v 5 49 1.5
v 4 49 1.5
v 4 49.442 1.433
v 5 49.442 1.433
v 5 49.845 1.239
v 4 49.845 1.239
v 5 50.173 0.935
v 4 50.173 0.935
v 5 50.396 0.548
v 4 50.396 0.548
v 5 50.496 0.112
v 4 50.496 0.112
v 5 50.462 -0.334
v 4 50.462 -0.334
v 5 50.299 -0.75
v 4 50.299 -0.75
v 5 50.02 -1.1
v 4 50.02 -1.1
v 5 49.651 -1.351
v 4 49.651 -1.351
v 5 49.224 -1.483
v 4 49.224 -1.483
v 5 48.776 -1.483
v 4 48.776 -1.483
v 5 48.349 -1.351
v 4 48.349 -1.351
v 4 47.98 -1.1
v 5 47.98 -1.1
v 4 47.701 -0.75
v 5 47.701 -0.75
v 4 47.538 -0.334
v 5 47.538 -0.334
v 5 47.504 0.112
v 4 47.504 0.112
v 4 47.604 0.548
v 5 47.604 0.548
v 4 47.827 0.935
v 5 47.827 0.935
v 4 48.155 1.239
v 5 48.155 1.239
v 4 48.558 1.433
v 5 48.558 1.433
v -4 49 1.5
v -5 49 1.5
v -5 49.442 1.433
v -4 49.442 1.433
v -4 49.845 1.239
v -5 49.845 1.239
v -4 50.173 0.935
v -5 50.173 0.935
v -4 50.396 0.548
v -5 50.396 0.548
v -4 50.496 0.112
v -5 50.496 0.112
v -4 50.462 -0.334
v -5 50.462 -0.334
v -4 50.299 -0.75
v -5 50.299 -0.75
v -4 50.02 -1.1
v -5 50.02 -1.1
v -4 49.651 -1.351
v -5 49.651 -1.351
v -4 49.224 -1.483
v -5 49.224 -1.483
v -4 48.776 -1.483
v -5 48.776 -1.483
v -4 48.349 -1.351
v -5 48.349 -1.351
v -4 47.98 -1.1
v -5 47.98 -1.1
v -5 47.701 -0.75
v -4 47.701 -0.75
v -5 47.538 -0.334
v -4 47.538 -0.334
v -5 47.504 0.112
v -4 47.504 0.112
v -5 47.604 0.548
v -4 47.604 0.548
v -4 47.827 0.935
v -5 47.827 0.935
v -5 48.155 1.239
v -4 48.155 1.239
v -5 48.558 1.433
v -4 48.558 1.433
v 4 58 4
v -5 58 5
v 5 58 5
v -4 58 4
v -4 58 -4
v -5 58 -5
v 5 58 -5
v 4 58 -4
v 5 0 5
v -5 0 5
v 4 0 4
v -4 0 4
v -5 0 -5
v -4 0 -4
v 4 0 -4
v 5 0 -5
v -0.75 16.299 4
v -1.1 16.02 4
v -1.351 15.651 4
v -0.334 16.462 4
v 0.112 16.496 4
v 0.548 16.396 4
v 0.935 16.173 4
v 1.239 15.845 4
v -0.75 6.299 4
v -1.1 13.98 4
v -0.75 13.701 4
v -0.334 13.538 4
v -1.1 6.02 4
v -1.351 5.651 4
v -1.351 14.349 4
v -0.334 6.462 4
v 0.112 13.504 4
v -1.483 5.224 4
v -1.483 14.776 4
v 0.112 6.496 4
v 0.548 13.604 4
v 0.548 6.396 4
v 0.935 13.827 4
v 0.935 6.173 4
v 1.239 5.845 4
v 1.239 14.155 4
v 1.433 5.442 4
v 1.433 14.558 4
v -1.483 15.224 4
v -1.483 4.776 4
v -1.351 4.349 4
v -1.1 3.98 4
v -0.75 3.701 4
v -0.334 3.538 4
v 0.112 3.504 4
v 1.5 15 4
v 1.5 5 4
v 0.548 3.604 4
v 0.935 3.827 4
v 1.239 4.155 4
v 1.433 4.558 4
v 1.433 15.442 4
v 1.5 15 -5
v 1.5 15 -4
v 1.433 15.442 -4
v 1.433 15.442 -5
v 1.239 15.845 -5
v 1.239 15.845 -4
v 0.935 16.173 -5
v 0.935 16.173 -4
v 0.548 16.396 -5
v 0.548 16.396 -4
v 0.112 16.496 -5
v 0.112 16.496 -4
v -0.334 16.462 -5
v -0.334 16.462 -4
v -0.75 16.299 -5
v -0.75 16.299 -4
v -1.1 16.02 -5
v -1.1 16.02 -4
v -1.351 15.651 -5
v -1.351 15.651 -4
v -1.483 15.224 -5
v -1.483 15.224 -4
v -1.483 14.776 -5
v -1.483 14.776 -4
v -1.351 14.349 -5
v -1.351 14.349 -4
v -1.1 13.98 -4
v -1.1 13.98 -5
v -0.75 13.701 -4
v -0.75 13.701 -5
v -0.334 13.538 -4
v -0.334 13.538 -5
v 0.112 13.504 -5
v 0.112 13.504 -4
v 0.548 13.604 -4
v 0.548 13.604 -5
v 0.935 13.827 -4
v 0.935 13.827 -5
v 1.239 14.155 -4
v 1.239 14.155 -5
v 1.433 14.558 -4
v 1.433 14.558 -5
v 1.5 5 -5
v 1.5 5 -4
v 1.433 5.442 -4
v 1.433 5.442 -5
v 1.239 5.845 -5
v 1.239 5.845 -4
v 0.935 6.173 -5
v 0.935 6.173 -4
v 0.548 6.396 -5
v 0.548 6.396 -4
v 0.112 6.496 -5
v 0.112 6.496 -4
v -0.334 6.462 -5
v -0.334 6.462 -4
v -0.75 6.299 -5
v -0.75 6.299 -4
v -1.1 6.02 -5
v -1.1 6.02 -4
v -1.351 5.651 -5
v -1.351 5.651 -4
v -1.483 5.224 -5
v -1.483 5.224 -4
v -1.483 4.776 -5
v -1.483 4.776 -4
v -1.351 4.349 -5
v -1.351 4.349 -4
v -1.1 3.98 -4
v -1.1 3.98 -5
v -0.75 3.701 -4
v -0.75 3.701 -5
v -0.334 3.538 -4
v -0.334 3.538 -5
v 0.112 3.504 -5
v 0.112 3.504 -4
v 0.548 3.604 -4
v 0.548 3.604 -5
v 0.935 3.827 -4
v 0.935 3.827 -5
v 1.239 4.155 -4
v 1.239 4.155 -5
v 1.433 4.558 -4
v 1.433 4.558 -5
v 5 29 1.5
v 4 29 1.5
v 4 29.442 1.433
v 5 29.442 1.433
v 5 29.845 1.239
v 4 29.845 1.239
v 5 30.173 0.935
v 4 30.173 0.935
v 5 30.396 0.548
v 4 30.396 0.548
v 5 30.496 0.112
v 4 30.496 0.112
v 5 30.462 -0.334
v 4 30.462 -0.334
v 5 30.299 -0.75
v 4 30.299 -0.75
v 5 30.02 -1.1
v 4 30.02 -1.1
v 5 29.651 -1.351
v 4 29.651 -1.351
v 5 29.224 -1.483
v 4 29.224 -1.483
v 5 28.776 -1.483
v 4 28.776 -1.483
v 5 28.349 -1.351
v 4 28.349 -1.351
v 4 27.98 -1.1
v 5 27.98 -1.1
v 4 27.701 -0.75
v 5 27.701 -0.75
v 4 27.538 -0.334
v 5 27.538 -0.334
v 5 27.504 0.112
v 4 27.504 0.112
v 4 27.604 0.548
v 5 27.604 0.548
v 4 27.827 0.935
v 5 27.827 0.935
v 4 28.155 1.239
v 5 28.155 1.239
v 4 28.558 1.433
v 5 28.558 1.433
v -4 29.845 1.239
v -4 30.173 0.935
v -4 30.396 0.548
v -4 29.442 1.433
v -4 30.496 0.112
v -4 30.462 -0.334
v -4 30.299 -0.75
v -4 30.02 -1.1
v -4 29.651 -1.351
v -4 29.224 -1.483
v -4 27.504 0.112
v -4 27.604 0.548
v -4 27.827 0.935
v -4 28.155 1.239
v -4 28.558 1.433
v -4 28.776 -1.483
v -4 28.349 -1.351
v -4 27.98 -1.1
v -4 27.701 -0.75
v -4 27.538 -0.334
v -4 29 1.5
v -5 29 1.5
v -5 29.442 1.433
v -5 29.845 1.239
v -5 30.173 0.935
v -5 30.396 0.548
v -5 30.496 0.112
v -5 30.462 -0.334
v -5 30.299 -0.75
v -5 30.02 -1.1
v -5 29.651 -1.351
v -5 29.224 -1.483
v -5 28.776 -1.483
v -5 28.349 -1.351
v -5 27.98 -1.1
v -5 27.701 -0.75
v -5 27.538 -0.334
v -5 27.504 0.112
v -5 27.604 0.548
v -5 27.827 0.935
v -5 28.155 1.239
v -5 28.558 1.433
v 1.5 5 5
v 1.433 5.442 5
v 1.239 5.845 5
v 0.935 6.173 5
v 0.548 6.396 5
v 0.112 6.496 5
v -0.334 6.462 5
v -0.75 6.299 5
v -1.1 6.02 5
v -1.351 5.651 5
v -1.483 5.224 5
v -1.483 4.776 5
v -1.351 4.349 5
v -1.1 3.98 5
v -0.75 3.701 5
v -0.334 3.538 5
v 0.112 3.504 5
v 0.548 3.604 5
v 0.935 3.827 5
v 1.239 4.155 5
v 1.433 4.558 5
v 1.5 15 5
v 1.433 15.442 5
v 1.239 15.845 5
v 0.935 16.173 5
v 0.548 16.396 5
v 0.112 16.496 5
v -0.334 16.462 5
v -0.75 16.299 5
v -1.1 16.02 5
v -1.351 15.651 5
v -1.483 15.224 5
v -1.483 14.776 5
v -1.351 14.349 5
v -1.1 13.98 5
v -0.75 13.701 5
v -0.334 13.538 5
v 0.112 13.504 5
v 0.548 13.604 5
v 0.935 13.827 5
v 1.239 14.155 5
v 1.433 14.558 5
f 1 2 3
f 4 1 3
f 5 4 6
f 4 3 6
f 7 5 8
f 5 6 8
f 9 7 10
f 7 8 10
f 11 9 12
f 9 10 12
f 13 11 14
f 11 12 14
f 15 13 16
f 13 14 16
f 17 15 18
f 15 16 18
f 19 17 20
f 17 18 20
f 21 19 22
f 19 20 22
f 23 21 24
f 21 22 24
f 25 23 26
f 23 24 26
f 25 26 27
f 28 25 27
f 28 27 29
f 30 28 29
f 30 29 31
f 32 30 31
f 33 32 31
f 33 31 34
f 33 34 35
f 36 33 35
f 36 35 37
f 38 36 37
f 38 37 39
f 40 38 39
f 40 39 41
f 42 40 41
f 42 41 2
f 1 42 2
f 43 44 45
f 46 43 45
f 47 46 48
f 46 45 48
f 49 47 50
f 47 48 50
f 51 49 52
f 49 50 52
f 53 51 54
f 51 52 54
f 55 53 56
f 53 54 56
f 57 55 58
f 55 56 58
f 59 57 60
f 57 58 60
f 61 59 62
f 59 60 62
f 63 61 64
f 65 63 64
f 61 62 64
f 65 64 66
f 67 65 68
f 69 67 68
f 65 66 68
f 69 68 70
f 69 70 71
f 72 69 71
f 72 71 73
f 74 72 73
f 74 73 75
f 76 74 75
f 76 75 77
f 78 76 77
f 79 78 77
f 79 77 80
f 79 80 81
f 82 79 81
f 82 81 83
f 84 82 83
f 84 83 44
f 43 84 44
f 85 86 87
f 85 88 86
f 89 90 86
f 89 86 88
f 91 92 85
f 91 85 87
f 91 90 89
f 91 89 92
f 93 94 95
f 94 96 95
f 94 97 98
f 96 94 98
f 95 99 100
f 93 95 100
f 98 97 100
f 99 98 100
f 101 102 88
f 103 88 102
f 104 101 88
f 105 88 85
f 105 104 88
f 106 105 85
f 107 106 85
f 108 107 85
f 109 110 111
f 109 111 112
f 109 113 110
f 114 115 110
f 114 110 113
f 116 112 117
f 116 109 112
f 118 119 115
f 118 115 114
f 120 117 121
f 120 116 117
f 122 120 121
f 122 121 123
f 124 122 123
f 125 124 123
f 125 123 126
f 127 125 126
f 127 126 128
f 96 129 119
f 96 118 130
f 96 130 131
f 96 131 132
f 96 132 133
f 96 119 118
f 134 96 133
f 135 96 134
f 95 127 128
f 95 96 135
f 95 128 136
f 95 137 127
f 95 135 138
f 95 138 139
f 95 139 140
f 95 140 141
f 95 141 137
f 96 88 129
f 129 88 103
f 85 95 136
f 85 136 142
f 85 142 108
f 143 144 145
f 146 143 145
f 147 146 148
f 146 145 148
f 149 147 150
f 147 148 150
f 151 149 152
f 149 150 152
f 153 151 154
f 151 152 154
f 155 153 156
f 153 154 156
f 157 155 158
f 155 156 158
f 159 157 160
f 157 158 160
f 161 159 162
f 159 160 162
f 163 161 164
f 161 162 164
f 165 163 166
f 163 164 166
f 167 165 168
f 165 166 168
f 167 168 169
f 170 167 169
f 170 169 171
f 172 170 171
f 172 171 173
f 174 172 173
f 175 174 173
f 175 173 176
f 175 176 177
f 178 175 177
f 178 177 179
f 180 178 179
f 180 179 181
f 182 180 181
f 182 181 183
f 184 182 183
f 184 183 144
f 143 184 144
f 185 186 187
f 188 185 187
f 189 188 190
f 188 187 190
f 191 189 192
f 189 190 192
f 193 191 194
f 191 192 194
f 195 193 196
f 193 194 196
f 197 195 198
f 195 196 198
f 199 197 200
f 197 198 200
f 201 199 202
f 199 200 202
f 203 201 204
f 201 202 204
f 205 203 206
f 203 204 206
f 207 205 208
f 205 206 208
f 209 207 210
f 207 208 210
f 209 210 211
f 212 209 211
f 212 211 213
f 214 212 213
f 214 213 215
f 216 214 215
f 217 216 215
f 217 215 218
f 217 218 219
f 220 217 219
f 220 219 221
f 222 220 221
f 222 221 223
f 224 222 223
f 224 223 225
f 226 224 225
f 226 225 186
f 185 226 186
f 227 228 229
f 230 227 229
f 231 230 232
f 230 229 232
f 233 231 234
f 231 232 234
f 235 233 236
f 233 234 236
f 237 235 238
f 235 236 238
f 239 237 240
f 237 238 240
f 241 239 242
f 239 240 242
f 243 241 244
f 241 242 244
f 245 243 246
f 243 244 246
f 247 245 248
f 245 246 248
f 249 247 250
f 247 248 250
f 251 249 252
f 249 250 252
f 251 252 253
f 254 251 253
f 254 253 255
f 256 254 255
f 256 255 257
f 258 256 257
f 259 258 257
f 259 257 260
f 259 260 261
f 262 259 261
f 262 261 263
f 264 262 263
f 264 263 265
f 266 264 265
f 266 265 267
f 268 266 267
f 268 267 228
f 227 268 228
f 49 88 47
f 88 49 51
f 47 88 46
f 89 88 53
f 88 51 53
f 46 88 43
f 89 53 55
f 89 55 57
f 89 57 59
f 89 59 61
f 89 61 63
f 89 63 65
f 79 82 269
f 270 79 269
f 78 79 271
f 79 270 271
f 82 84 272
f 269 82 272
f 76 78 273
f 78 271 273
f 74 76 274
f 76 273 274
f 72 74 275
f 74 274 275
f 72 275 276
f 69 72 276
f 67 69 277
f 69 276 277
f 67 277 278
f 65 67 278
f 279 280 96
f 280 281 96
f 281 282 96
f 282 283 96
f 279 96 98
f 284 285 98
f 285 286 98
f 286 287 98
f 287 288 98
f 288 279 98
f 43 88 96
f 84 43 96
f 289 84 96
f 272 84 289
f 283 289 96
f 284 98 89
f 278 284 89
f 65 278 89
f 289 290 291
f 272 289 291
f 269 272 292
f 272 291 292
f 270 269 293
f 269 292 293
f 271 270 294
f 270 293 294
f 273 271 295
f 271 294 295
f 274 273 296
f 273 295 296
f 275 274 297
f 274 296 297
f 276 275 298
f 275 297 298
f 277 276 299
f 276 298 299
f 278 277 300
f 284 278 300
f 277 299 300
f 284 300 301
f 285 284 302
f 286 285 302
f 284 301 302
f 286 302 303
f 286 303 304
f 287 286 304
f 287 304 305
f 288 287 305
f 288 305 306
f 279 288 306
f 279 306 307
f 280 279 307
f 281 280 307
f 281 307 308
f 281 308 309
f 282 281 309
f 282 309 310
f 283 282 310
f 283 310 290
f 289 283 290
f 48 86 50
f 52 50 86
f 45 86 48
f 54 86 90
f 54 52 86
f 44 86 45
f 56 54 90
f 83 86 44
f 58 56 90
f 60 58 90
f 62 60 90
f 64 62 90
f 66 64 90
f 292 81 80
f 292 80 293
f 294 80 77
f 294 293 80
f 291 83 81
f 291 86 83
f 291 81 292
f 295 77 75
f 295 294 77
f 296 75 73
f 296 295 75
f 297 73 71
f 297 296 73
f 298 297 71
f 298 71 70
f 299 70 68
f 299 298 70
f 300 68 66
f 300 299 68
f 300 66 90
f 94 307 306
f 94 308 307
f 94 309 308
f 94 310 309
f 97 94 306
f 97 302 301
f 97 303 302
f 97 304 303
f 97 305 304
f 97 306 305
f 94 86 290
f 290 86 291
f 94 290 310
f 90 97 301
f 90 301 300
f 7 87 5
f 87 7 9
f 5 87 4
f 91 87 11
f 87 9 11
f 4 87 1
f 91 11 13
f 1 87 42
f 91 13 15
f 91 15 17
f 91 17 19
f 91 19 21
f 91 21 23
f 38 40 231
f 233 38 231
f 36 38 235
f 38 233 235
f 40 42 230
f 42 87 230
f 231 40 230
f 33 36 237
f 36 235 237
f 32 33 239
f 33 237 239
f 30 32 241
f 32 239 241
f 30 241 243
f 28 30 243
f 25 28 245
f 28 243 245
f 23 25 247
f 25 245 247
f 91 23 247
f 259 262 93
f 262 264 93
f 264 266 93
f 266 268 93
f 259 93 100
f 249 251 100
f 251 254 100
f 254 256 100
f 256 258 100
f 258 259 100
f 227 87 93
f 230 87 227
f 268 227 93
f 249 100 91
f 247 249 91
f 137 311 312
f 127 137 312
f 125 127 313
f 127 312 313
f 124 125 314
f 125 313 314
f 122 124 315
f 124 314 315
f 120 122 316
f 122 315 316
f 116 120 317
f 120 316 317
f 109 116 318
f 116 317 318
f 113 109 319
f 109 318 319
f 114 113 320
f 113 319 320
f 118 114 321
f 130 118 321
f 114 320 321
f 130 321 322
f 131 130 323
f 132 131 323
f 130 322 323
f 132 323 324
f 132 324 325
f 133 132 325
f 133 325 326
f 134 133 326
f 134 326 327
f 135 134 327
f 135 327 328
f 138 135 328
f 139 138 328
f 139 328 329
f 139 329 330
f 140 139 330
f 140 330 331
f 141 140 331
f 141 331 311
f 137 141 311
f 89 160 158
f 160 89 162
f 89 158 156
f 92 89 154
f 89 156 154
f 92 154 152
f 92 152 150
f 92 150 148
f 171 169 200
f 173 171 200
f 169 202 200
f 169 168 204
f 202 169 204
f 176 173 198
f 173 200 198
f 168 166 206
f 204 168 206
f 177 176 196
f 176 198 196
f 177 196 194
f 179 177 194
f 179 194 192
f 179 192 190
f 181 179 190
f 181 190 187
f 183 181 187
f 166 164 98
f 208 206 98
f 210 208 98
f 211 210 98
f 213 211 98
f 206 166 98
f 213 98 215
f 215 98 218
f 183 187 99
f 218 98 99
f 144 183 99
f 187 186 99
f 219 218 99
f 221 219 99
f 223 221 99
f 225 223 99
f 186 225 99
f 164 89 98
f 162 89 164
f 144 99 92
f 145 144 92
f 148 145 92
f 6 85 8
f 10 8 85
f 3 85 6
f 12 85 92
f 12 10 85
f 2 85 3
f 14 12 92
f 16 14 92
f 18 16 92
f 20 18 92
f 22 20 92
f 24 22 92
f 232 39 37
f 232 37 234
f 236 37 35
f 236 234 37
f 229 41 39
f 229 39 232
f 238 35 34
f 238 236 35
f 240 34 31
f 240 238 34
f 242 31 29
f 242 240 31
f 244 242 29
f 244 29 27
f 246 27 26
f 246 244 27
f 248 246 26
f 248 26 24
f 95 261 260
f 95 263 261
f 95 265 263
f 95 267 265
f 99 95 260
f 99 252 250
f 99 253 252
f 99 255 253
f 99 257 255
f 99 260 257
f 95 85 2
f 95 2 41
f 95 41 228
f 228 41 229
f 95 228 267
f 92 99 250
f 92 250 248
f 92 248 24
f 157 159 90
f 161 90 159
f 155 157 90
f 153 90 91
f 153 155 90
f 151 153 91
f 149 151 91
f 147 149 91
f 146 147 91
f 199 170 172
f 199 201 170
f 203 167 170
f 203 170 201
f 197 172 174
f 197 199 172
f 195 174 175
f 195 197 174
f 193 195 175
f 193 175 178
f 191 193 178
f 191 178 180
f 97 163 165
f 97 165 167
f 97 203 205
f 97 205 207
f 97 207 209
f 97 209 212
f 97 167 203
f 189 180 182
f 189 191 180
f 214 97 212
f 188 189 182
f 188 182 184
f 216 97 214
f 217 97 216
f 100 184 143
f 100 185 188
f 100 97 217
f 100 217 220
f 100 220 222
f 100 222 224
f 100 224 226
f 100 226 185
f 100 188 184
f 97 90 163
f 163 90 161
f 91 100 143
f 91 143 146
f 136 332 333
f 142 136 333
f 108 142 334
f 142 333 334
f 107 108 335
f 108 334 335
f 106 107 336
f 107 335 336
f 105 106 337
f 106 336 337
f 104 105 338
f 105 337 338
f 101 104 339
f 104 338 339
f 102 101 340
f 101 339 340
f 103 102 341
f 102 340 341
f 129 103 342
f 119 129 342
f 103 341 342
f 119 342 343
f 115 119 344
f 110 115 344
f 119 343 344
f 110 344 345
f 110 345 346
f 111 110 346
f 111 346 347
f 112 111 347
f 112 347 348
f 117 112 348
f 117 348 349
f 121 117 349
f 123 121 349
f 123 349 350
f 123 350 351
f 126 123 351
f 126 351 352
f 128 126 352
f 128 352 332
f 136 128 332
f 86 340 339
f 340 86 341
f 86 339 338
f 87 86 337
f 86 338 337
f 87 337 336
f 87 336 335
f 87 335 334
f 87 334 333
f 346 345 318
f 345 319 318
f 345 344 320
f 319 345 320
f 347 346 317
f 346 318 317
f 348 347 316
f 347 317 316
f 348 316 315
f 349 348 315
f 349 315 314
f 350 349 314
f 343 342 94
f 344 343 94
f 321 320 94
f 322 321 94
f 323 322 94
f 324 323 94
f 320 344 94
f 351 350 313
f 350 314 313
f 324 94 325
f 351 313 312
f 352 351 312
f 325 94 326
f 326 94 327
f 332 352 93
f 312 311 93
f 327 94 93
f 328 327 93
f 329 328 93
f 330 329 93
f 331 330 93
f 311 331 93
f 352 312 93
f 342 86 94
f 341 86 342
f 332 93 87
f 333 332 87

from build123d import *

# Parameters (mm, degrees)
SKETCH_1_W          = 10
SKETCH_1_H          = 10
SKETCH_1_W_2        = 8
SKETCH_1_H_2        = 8
EXTRUDE_1_DEPTH     = 58
SKETCH_2_R          = 1.5
CUT_EXTRUDE_1_DEPTH = 30
SKETCH_3_R          = 1.5
CUT_EXTRUDE_2_DEPTH = 30


with BuildPart() as part:
    # 草图1 → 凸台-拉伸1 (new body)
    with BuildSketch(Plane(origin=(0, 0, 0), x_dir=(1, 0, 0), z_dir=(0, 1, 0))):
        Rectangle(SKETCH_1_W, SKETCH_1_H)
        Rectangle(SKETCH_1_W_2, SKETCH_1_H_2, mode=Mode.SUBTRACT)
    extrude(amount=EXTRUDE_1_DEPTH)

    # 草图2 → 切除-拉伸1 (cut)
    with BuildSketch(Plane.XY.offset(5)):
        with Locations((0, 5)):
            Circle(SKETCH_2_R)
        with Locations((0, 15)):
            Circle(SKETCH_2_R)
    extrude(amount=-CUT_EXTRUDE_1_DEPTH, mode=Mode.SUBTRACT)

    # 草图3 → 切除-拉伸2 (cut)
    with BuildSketch(Plane.ZY.offset(5)):
        with Locations((0, 49)):
            Circle(SKETCH_3_R)
        with Locations((0, 29)):
            Circle(SKETCH_3_R)
    extrude(amount=-CUT_EXTRUDE_2_DEPTH, mode=Mode.SUBTRACT)


solid = part.part
